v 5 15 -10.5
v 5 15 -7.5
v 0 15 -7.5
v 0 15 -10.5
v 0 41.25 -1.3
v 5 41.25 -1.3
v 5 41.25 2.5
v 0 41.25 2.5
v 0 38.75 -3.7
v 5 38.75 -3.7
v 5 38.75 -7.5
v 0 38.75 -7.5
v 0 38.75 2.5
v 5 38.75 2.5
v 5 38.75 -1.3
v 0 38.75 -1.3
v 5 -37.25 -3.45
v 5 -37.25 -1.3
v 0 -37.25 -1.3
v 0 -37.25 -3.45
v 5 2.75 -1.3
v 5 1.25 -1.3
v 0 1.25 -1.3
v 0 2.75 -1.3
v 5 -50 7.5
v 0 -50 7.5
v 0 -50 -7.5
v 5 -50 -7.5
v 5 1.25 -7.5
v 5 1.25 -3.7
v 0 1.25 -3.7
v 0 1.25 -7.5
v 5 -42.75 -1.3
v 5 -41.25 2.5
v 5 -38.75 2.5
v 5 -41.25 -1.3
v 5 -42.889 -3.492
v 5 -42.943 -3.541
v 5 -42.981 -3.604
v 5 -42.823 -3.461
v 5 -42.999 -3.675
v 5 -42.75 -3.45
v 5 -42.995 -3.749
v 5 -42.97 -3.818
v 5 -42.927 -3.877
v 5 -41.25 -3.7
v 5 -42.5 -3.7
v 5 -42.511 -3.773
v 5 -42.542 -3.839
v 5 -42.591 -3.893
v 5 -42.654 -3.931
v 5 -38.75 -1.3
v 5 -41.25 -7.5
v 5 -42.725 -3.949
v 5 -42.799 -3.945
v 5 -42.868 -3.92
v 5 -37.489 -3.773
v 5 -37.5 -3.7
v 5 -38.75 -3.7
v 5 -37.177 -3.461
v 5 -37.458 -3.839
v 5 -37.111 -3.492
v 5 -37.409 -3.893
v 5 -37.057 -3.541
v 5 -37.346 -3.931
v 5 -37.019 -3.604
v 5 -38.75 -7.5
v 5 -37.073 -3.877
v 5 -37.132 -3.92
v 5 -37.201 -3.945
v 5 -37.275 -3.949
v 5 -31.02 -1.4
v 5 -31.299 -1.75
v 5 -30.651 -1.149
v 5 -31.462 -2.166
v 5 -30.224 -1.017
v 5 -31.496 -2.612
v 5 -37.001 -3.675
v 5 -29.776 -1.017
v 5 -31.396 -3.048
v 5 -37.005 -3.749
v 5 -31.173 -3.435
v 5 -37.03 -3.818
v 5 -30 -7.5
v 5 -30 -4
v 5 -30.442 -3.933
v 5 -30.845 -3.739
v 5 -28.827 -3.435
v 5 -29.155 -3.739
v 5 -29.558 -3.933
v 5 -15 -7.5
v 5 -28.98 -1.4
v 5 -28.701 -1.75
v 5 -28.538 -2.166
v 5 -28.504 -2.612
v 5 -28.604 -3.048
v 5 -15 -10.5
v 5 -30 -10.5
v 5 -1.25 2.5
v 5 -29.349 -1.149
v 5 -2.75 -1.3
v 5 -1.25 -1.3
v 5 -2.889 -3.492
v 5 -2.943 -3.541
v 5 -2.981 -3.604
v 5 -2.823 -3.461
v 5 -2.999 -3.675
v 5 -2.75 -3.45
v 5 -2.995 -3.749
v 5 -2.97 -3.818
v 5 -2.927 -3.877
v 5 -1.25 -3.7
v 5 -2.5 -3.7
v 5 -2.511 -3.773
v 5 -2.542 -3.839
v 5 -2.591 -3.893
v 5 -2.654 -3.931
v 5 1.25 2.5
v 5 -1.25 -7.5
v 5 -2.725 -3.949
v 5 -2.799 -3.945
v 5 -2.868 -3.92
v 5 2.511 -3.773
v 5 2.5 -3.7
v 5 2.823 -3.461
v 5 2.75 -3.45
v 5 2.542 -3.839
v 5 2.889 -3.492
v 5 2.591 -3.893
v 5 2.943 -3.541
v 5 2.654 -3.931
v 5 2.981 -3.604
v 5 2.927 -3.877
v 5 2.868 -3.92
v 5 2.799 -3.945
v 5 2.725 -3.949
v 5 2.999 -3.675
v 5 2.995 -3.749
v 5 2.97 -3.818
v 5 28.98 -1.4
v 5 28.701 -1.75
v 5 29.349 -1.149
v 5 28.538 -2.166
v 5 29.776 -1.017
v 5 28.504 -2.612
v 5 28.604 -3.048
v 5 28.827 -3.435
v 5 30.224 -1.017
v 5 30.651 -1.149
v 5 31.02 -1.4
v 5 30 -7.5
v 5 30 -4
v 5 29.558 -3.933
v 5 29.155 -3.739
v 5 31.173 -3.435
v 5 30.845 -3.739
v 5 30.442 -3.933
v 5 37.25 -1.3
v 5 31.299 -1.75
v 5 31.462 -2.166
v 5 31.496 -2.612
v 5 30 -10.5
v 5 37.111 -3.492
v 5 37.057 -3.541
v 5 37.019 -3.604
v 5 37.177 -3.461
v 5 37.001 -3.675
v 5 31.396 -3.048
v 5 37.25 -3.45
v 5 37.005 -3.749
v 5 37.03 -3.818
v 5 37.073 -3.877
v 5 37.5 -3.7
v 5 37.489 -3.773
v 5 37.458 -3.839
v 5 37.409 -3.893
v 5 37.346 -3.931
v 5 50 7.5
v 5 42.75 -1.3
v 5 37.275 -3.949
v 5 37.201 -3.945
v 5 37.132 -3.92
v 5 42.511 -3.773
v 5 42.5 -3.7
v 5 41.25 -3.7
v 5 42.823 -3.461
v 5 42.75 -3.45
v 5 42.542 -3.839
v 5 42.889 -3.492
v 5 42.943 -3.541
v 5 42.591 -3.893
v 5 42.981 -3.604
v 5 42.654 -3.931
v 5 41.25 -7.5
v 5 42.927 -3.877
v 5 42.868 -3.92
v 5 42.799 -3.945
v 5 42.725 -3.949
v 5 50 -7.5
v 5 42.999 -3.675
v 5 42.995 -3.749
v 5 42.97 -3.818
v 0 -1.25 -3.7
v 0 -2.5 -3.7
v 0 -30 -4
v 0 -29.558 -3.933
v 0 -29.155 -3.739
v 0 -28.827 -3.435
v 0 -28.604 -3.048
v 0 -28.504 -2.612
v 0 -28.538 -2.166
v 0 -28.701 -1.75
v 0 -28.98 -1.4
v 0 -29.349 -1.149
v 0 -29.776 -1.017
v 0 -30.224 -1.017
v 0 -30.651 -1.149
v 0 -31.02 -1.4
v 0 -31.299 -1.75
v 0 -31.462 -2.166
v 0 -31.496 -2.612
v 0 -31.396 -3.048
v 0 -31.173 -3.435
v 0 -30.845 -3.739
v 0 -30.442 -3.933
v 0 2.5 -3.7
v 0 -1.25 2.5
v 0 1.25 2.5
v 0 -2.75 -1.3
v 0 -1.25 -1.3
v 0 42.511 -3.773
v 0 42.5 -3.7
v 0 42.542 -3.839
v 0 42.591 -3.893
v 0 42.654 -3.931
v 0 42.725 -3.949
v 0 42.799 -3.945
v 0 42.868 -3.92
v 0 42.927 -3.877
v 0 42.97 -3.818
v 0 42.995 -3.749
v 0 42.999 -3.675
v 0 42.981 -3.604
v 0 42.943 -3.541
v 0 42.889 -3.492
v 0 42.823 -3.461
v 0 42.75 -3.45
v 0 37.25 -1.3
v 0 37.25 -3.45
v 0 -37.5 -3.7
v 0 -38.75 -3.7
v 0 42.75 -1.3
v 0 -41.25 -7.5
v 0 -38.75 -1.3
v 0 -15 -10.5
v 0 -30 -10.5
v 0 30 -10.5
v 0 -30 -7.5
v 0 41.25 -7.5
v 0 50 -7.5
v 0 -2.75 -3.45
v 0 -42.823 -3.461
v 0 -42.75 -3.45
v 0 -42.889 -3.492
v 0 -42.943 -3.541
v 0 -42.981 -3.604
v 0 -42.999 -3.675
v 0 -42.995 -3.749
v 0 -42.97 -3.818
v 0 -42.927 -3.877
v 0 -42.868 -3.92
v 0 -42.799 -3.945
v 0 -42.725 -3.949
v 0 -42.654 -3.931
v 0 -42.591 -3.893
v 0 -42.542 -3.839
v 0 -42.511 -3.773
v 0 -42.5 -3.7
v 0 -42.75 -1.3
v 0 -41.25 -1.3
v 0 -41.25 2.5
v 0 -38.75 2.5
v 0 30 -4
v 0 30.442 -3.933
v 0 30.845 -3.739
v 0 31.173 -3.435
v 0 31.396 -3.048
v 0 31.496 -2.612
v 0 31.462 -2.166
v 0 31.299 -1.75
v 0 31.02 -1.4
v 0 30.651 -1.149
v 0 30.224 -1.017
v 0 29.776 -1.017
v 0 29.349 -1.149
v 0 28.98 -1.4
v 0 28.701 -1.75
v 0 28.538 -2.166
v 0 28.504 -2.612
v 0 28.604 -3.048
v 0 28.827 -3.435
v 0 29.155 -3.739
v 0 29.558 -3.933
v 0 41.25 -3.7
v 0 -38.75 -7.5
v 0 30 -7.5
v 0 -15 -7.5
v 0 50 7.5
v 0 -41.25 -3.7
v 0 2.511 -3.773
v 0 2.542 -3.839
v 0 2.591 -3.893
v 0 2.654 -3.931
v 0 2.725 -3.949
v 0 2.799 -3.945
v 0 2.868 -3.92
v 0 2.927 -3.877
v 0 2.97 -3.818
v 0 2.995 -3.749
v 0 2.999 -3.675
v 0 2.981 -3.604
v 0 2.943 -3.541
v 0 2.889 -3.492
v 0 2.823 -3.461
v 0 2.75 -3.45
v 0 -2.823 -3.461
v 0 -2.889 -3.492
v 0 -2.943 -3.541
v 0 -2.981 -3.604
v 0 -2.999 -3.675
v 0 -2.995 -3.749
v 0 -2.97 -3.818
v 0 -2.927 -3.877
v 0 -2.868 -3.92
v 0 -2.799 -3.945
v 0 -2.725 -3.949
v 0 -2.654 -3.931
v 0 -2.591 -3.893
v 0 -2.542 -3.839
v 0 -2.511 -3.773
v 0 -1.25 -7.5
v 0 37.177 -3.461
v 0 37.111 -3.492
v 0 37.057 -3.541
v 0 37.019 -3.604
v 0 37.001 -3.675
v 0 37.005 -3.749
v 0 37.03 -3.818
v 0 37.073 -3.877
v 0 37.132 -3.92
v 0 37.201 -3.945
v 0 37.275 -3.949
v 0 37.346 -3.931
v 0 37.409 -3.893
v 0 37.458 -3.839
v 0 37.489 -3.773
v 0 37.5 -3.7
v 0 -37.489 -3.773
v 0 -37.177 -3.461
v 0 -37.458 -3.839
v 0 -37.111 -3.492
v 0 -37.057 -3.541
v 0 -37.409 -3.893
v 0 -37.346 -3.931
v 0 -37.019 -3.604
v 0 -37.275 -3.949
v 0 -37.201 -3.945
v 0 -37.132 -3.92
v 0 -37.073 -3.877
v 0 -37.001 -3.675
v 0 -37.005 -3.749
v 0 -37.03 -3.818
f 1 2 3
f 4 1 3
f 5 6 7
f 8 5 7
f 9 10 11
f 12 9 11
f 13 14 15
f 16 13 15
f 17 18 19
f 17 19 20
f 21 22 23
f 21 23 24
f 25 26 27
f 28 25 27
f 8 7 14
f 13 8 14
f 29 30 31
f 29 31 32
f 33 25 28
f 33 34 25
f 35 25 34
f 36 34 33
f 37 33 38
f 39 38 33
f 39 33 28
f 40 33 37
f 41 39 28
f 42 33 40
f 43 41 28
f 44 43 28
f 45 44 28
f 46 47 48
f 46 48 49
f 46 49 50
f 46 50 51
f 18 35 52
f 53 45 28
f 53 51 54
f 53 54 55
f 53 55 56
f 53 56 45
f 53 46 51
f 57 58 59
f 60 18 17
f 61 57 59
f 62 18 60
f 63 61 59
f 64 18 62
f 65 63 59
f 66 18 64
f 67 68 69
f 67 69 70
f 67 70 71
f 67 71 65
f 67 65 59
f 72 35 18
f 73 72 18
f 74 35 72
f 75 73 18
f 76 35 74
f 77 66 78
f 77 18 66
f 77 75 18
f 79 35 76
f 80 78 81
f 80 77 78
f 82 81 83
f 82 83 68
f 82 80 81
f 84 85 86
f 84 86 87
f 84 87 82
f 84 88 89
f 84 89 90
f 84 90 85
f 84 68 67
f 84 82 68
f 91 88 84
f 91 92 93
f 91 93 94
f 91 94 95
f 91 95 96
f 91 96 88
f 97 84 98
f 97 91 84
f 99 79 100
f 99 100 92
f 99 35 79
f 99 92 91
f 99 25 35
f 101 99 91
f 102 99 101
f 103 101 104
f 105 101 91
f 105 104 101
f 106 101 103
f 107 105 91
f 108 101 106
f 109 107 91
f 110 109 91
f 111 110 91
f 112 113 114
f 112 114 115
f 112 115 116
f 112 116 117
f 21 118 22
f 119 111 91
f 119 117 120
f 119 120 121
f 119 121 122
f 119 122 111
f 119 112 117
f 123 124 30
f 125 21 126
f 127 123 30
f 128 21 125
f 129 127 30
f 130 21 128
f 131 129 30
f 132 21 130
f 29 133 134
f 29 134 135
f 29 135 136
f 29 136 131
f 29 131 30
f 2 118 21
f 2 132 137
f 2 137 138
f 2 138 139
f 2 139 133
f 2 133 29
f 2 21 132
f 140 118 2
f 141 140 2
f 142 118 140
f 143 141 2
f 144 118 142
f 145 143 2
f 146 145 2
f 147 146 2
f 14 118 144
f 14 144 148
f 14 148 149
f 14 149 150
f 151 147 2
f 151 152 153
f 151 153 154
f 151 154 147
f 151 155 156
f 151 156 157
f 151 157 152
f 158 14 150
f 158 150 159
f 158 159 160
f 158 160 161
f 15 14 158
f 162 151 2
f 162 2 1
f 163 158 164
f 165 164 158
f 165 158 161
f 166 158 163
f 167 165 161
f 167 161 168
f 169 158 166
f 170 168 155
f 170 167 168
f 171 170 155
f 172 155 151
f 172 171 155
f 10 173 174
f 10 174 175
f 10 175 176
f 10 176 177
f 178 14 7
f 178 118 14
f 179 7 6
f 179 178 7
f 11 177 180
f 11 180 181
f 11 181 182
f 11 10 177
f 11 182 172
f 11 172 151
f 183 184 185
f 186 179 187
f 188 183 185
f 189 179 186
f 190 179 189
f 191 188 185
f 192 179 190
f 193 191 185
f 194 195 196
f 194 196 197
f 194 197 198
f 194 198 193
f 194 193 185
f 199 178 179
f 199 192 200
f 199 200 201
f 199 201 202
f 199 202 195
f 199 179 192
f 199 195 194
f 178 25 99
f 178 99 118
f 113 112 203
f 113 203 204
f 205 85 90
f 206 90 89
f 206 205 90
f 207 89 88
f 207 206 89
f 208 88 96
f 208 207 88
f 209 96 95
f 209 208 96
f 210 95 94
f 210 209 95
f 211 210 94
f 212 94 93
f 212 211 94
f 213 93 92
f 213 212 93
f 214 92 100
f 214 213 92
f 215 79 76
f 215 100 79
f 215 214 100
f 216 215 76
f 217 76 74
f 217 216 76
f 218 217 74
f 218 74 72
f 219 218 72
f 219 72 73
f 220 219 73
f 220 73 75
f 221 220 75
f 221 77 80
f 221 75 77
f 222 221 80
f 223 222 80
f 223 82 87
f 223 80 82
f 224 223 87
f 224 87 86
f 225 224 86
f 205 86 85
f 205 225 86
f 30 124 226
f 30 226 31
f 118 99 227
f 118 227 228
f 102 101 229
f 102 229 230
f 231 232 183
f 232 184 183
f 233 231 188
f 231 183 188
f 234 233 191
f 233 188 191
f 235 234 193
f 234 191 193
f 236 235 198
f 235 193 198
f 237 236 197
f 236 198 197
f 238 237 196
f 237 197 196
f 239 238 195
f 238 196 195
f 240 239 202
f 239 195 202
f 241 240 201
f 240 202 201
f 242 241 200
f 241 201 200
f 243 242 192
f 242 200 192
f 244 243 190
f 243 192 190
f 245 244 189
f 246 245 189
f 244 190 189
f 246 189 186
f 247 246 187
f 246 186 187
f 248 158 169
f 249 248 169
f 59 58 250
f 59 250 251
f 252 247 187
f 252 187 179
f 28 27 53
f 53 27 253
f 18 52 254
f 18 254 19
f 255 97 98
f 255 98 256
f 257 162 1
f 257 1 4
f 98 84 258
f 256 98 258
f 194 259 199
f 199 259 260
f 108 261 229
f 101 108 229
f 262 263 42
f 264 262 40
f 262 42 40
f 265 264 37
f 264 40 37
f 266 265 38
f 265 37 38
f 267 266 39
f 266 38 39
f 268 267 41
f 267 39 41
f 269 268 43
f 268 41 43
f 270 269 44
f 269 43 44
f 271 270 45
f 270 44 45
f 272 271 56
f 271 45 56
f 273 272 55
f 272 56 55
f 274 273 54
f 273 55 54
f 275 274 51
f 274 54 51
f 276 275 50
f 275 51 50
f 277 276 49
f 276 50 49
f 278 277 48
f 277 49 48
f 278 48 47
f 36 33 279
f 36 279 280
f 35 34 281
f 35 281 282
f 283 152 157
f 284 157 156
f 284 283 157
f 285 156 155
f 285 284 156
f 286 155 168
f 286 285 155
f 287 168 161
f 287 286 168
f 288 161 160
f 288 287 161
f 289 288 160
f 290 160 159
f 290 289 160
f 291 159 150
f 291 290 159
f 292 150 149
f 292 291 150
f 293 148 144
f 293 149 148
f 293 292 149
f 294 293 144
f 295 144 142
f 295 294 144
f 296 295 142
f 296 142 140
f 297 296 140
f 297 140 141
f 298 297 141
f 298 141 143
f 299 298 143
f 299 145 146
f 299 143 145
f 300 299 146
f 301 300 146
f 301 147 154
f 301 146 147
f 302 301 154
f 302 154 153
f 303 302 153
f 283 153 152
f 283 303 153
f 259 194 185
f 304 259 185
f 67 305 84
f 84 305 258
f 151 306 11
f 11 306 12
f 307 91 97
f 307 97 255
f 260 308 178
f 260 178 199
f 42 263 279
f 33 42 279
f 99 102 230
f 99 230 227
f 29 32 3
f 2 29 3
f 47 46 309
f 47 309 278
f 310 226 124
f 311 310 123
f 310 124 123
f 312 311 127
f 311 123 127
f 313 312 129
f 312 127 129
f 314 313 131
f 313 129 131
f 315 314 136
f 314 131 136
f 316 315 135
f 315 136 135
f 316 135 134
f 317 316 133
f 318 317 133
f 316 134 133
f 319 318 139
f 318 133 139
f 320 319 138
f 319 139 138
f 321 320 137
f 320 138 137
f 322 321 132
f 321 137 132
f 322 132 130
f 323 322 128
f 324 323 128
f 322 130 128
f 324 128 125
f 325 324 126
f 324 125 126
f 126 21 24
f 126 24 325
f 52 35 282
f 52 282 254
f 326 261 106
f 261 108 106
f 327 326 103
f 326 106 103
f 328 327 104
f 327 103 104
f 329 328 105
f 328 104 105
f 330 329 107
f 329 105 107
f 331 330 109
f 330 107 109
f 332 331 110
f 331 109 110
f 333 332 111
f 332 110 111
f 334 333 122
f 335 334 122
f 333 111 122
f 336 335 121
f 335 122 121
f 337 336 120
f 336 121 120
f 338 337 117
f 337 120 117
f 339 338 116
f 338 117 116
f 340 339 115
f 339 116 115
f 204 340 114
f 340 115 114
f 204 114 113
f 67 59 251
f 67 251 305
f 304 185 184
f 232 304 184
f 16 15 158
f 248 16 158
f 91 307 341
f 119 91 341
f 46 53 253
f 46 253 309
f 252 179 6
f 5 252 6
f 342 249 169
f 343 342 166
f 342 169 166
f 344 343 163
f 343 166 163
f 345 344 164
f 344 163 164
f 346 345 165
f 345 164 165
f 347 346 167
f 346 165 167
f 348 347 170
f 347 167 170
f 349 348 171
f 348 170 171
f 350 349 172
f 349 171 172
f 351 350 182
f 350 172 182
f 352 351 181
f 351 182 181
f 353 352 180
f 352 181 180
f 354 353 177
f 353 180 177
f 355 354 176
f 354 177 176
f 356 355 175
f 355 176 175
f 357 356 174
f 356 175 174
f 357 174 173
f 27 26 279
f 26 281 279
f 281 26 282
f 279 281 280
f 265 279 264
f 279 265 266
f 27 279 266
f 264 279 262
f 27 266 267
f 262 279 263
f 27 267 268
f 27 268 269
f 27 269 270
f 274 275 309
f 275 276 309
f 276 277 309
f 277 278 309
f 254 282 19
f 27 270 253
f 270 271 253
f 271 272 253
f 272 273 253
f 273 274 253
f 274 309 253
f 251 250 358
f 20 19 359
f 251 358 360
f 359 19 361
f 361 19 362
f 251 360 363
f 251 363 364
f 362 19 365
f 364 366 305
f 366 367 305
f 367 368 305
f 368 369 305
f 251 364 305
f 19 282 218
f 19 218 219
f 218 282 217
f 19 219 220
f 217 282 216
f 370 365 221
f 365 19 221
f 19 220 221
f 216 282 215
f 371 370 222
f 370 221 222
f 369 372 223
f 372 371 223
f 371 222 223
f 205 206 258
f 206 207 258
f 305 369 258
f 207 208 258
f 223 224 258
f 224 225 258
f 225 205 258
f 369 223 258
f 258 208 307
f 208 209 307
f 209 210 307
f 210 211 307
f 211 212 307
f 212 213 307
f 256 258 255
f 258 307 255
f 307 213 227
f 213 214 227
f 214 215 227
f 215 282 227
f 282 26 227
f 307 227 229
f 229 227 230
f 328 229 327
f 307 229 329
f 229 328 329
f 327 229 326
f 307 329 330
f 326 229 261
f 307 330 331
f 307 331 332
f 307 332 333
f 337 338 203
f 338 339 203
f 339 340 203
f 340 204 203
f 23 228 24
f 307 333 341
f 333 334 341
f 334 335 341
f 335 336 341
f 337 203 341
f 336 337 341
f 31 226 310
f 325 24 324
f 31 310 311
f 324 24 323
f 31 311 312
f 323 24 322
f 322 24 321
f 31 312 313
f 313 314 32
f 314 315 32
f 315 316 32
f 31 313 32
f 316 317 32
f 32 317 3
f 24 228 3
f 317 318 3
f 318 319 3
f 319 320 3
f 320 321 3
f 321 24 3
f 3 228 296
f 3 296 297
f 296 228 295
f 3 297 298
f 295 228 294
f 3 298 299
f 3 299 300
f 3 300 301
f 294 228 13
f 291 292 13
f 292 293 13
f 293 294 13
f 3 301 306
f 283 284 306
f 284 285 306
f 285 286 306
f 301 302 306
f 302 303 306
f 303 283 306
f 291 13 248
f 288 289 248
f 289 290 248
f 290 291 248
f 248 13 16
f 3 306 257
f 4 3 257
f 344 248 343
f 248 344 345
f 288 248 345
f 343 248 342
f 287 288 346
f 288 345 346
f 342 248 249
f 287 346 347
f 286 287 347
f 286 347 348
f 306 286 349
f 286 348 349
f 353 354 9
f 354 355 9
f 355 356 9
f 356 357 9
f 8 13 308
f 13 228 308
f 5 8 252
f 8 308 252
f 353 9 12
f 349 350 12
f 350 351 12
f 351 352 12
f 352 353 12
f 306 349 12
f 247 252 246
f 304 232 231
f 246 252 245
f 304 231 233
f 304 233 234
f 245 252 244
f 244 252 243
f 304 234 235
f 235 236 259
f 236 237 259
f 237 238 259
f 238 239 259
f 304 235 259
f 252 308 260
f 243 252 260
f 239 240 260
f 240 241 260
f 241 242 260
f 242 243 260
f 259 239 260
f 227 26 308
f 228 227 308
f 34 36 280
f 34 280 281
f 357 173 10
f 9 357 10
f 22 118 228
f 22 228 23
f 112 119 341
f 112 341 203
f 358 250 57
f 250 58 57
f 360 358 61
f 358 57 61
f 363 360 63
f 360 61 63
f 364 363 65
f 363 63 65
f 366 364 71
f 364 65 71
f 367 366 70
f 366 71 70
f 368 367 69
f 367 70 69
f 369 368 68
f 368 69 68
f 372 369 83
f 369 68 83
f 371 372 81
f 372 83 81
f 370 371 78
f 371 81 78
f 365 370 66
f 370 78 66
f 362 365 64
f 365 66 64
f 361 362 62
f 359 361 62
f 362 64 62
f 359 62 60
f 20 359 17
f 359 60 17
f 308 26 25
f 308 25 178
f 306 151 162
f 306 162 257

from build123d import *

# Parameters (mm, degrees)
SCHIZZO1_W                   = 15
SCHIZZO1_H                   = 100
ESTRUSIONE_ESTRUSIONE1_DEPTH = 5
SCHIZZO2_W                   = 5
SCHIZZO2_H                   = 15
ESTRUSIONE_ESTRUSIONE2_DEPTH = 3
SCHIZZO4_R                   = 1.5
TAGLIO_ESTRUSIONE2_DEPTH     = 6
TAGLIO_ESTRUSIONE3_DEPTH     = 6
SCHIZZO6_R                   = 0.25
TAGLIO_ESTRUSIONE4_DEPTH     = 10


with BuildPart() as part:
    # Schizzo1 → Estrusione-Estrusione1 (new body)
    with BuildSketch(Plane(origin=(0, 0, 0), x_dir=(0, 0, -1), z_dir=(1, 0, 0))):
        Rectangle(SCHIZZO1_W, SCHIZZO1_H)
    extrude(amount=ESTRUSIONE_ESTRUSIONE1_DEPTH)

    # Schizzo2 → Estrusione-Estrusione2 (add)
    with BuildSketch(Plane(origin=(0, 0, -7.5), x_dir=(-1, 0, 0), z_dir=(0, 0, -1))):
        with Locations((-2.5, 22.5)):
            Rectangle(SCHIZZO2_W, SCHIZZO2_H)
        with Locations((-2.5, -22.5)):
            Rectangle(SCHIZZO2_W, SCHIZZO2_H)
    extrude(amount=ESTRUSIONE_ESTRUSIONE2_DEPTH)

    # Schizzo4 → Taglio-Estrusione2 (cut, through all)
    with BuildSketch(Plane(origin=(0, 0, 0), x_dir=(0, 0, -1), z_dir=(1, 0, 0))):
        with Locations((2.5, 30)):
            Circle(SCHIZZO4_R)
        with Locations((2.5, -30)):
            Circle(SCHIZZO4_R)
    extrude(amount=TAGLIO_ESTRUSIONE2_DEPTH, mode=Mode.SUBTRACT)

    # Schizzo5 → Taglio-Estrusione3 (cut, through all)
    with BuildSketch(Plane(origin=(5, 0, 0), x_dir=(0, 0, -1), z_dir=(1, 0, 0))):
        Polygon((-2.5, 1.25), (1.3, 1.25), (1.3, 2.75), (3.7, 2.75), (3.7, 1.25), (7.5, 1.25), (7.5, -1.25), (3.7, -1.25), (3.7, -2.75), (1.3, -2.75), (1.3, -1.25), (-2.5, -1.25), align=None)
        Polygon((-2.5, -38.75), (1.3, -38.75), (1.3, -37.25), (3.7, -37.25), (3.7, -38.75), (7.5, -38.75), (7.5, -41.25), (3.7, -41.25), (3.7, -42.75), (1.3, -42.75), (1.3, -41.25), (-2.5, -41.25), align=None)
        Polygon((7.5, 38.75), (7.5, 41.25), (3.7, 41.25), (3.7, 42.75), (1.3, 42.75), (1.3, 41.25), (-2.5, 41.25), (-2.5, 38.75), (1.3, 38.75), (1.3, 37.25), (3.7, 37.25), (3.7, 38.75), align=None)
    extrude(amount=-TAGLIO_ESTRUSIONE3_DEPTH, mode=Mode.SUBTRACT)

    # Schizzo6 → Taglio-Estrusione4 (cut)
    with BuildSketch(Plane(origin=(5, 0, 0), x_dir=(0, 0, -1), z_dir=(1, 0, 0))):
        with Locations((3.7, 42.75)):
            Circle(SCHIZZO6_R)
        with Locations((3.7, 37.25)):
            Circle(SCHIZZO6_R)
        with Locations((3.7, 2.75)):
            Circle(SCHIZZO6_R)
        with Locations((3.7, -2.75)):
            Circle(SCHIZZO6_R)
        with Locations((3.7, -37.25)):
            Circle(SCHIZZO6_R)
        with Locations((3.7, -42.75)):
            Circle(SCHIZZO6_R)
    extrude(amount=-TAGLIO_ESTRUSIONE4_DEPTH, mode=Mode.SUBTRACT)


solid = part.part
